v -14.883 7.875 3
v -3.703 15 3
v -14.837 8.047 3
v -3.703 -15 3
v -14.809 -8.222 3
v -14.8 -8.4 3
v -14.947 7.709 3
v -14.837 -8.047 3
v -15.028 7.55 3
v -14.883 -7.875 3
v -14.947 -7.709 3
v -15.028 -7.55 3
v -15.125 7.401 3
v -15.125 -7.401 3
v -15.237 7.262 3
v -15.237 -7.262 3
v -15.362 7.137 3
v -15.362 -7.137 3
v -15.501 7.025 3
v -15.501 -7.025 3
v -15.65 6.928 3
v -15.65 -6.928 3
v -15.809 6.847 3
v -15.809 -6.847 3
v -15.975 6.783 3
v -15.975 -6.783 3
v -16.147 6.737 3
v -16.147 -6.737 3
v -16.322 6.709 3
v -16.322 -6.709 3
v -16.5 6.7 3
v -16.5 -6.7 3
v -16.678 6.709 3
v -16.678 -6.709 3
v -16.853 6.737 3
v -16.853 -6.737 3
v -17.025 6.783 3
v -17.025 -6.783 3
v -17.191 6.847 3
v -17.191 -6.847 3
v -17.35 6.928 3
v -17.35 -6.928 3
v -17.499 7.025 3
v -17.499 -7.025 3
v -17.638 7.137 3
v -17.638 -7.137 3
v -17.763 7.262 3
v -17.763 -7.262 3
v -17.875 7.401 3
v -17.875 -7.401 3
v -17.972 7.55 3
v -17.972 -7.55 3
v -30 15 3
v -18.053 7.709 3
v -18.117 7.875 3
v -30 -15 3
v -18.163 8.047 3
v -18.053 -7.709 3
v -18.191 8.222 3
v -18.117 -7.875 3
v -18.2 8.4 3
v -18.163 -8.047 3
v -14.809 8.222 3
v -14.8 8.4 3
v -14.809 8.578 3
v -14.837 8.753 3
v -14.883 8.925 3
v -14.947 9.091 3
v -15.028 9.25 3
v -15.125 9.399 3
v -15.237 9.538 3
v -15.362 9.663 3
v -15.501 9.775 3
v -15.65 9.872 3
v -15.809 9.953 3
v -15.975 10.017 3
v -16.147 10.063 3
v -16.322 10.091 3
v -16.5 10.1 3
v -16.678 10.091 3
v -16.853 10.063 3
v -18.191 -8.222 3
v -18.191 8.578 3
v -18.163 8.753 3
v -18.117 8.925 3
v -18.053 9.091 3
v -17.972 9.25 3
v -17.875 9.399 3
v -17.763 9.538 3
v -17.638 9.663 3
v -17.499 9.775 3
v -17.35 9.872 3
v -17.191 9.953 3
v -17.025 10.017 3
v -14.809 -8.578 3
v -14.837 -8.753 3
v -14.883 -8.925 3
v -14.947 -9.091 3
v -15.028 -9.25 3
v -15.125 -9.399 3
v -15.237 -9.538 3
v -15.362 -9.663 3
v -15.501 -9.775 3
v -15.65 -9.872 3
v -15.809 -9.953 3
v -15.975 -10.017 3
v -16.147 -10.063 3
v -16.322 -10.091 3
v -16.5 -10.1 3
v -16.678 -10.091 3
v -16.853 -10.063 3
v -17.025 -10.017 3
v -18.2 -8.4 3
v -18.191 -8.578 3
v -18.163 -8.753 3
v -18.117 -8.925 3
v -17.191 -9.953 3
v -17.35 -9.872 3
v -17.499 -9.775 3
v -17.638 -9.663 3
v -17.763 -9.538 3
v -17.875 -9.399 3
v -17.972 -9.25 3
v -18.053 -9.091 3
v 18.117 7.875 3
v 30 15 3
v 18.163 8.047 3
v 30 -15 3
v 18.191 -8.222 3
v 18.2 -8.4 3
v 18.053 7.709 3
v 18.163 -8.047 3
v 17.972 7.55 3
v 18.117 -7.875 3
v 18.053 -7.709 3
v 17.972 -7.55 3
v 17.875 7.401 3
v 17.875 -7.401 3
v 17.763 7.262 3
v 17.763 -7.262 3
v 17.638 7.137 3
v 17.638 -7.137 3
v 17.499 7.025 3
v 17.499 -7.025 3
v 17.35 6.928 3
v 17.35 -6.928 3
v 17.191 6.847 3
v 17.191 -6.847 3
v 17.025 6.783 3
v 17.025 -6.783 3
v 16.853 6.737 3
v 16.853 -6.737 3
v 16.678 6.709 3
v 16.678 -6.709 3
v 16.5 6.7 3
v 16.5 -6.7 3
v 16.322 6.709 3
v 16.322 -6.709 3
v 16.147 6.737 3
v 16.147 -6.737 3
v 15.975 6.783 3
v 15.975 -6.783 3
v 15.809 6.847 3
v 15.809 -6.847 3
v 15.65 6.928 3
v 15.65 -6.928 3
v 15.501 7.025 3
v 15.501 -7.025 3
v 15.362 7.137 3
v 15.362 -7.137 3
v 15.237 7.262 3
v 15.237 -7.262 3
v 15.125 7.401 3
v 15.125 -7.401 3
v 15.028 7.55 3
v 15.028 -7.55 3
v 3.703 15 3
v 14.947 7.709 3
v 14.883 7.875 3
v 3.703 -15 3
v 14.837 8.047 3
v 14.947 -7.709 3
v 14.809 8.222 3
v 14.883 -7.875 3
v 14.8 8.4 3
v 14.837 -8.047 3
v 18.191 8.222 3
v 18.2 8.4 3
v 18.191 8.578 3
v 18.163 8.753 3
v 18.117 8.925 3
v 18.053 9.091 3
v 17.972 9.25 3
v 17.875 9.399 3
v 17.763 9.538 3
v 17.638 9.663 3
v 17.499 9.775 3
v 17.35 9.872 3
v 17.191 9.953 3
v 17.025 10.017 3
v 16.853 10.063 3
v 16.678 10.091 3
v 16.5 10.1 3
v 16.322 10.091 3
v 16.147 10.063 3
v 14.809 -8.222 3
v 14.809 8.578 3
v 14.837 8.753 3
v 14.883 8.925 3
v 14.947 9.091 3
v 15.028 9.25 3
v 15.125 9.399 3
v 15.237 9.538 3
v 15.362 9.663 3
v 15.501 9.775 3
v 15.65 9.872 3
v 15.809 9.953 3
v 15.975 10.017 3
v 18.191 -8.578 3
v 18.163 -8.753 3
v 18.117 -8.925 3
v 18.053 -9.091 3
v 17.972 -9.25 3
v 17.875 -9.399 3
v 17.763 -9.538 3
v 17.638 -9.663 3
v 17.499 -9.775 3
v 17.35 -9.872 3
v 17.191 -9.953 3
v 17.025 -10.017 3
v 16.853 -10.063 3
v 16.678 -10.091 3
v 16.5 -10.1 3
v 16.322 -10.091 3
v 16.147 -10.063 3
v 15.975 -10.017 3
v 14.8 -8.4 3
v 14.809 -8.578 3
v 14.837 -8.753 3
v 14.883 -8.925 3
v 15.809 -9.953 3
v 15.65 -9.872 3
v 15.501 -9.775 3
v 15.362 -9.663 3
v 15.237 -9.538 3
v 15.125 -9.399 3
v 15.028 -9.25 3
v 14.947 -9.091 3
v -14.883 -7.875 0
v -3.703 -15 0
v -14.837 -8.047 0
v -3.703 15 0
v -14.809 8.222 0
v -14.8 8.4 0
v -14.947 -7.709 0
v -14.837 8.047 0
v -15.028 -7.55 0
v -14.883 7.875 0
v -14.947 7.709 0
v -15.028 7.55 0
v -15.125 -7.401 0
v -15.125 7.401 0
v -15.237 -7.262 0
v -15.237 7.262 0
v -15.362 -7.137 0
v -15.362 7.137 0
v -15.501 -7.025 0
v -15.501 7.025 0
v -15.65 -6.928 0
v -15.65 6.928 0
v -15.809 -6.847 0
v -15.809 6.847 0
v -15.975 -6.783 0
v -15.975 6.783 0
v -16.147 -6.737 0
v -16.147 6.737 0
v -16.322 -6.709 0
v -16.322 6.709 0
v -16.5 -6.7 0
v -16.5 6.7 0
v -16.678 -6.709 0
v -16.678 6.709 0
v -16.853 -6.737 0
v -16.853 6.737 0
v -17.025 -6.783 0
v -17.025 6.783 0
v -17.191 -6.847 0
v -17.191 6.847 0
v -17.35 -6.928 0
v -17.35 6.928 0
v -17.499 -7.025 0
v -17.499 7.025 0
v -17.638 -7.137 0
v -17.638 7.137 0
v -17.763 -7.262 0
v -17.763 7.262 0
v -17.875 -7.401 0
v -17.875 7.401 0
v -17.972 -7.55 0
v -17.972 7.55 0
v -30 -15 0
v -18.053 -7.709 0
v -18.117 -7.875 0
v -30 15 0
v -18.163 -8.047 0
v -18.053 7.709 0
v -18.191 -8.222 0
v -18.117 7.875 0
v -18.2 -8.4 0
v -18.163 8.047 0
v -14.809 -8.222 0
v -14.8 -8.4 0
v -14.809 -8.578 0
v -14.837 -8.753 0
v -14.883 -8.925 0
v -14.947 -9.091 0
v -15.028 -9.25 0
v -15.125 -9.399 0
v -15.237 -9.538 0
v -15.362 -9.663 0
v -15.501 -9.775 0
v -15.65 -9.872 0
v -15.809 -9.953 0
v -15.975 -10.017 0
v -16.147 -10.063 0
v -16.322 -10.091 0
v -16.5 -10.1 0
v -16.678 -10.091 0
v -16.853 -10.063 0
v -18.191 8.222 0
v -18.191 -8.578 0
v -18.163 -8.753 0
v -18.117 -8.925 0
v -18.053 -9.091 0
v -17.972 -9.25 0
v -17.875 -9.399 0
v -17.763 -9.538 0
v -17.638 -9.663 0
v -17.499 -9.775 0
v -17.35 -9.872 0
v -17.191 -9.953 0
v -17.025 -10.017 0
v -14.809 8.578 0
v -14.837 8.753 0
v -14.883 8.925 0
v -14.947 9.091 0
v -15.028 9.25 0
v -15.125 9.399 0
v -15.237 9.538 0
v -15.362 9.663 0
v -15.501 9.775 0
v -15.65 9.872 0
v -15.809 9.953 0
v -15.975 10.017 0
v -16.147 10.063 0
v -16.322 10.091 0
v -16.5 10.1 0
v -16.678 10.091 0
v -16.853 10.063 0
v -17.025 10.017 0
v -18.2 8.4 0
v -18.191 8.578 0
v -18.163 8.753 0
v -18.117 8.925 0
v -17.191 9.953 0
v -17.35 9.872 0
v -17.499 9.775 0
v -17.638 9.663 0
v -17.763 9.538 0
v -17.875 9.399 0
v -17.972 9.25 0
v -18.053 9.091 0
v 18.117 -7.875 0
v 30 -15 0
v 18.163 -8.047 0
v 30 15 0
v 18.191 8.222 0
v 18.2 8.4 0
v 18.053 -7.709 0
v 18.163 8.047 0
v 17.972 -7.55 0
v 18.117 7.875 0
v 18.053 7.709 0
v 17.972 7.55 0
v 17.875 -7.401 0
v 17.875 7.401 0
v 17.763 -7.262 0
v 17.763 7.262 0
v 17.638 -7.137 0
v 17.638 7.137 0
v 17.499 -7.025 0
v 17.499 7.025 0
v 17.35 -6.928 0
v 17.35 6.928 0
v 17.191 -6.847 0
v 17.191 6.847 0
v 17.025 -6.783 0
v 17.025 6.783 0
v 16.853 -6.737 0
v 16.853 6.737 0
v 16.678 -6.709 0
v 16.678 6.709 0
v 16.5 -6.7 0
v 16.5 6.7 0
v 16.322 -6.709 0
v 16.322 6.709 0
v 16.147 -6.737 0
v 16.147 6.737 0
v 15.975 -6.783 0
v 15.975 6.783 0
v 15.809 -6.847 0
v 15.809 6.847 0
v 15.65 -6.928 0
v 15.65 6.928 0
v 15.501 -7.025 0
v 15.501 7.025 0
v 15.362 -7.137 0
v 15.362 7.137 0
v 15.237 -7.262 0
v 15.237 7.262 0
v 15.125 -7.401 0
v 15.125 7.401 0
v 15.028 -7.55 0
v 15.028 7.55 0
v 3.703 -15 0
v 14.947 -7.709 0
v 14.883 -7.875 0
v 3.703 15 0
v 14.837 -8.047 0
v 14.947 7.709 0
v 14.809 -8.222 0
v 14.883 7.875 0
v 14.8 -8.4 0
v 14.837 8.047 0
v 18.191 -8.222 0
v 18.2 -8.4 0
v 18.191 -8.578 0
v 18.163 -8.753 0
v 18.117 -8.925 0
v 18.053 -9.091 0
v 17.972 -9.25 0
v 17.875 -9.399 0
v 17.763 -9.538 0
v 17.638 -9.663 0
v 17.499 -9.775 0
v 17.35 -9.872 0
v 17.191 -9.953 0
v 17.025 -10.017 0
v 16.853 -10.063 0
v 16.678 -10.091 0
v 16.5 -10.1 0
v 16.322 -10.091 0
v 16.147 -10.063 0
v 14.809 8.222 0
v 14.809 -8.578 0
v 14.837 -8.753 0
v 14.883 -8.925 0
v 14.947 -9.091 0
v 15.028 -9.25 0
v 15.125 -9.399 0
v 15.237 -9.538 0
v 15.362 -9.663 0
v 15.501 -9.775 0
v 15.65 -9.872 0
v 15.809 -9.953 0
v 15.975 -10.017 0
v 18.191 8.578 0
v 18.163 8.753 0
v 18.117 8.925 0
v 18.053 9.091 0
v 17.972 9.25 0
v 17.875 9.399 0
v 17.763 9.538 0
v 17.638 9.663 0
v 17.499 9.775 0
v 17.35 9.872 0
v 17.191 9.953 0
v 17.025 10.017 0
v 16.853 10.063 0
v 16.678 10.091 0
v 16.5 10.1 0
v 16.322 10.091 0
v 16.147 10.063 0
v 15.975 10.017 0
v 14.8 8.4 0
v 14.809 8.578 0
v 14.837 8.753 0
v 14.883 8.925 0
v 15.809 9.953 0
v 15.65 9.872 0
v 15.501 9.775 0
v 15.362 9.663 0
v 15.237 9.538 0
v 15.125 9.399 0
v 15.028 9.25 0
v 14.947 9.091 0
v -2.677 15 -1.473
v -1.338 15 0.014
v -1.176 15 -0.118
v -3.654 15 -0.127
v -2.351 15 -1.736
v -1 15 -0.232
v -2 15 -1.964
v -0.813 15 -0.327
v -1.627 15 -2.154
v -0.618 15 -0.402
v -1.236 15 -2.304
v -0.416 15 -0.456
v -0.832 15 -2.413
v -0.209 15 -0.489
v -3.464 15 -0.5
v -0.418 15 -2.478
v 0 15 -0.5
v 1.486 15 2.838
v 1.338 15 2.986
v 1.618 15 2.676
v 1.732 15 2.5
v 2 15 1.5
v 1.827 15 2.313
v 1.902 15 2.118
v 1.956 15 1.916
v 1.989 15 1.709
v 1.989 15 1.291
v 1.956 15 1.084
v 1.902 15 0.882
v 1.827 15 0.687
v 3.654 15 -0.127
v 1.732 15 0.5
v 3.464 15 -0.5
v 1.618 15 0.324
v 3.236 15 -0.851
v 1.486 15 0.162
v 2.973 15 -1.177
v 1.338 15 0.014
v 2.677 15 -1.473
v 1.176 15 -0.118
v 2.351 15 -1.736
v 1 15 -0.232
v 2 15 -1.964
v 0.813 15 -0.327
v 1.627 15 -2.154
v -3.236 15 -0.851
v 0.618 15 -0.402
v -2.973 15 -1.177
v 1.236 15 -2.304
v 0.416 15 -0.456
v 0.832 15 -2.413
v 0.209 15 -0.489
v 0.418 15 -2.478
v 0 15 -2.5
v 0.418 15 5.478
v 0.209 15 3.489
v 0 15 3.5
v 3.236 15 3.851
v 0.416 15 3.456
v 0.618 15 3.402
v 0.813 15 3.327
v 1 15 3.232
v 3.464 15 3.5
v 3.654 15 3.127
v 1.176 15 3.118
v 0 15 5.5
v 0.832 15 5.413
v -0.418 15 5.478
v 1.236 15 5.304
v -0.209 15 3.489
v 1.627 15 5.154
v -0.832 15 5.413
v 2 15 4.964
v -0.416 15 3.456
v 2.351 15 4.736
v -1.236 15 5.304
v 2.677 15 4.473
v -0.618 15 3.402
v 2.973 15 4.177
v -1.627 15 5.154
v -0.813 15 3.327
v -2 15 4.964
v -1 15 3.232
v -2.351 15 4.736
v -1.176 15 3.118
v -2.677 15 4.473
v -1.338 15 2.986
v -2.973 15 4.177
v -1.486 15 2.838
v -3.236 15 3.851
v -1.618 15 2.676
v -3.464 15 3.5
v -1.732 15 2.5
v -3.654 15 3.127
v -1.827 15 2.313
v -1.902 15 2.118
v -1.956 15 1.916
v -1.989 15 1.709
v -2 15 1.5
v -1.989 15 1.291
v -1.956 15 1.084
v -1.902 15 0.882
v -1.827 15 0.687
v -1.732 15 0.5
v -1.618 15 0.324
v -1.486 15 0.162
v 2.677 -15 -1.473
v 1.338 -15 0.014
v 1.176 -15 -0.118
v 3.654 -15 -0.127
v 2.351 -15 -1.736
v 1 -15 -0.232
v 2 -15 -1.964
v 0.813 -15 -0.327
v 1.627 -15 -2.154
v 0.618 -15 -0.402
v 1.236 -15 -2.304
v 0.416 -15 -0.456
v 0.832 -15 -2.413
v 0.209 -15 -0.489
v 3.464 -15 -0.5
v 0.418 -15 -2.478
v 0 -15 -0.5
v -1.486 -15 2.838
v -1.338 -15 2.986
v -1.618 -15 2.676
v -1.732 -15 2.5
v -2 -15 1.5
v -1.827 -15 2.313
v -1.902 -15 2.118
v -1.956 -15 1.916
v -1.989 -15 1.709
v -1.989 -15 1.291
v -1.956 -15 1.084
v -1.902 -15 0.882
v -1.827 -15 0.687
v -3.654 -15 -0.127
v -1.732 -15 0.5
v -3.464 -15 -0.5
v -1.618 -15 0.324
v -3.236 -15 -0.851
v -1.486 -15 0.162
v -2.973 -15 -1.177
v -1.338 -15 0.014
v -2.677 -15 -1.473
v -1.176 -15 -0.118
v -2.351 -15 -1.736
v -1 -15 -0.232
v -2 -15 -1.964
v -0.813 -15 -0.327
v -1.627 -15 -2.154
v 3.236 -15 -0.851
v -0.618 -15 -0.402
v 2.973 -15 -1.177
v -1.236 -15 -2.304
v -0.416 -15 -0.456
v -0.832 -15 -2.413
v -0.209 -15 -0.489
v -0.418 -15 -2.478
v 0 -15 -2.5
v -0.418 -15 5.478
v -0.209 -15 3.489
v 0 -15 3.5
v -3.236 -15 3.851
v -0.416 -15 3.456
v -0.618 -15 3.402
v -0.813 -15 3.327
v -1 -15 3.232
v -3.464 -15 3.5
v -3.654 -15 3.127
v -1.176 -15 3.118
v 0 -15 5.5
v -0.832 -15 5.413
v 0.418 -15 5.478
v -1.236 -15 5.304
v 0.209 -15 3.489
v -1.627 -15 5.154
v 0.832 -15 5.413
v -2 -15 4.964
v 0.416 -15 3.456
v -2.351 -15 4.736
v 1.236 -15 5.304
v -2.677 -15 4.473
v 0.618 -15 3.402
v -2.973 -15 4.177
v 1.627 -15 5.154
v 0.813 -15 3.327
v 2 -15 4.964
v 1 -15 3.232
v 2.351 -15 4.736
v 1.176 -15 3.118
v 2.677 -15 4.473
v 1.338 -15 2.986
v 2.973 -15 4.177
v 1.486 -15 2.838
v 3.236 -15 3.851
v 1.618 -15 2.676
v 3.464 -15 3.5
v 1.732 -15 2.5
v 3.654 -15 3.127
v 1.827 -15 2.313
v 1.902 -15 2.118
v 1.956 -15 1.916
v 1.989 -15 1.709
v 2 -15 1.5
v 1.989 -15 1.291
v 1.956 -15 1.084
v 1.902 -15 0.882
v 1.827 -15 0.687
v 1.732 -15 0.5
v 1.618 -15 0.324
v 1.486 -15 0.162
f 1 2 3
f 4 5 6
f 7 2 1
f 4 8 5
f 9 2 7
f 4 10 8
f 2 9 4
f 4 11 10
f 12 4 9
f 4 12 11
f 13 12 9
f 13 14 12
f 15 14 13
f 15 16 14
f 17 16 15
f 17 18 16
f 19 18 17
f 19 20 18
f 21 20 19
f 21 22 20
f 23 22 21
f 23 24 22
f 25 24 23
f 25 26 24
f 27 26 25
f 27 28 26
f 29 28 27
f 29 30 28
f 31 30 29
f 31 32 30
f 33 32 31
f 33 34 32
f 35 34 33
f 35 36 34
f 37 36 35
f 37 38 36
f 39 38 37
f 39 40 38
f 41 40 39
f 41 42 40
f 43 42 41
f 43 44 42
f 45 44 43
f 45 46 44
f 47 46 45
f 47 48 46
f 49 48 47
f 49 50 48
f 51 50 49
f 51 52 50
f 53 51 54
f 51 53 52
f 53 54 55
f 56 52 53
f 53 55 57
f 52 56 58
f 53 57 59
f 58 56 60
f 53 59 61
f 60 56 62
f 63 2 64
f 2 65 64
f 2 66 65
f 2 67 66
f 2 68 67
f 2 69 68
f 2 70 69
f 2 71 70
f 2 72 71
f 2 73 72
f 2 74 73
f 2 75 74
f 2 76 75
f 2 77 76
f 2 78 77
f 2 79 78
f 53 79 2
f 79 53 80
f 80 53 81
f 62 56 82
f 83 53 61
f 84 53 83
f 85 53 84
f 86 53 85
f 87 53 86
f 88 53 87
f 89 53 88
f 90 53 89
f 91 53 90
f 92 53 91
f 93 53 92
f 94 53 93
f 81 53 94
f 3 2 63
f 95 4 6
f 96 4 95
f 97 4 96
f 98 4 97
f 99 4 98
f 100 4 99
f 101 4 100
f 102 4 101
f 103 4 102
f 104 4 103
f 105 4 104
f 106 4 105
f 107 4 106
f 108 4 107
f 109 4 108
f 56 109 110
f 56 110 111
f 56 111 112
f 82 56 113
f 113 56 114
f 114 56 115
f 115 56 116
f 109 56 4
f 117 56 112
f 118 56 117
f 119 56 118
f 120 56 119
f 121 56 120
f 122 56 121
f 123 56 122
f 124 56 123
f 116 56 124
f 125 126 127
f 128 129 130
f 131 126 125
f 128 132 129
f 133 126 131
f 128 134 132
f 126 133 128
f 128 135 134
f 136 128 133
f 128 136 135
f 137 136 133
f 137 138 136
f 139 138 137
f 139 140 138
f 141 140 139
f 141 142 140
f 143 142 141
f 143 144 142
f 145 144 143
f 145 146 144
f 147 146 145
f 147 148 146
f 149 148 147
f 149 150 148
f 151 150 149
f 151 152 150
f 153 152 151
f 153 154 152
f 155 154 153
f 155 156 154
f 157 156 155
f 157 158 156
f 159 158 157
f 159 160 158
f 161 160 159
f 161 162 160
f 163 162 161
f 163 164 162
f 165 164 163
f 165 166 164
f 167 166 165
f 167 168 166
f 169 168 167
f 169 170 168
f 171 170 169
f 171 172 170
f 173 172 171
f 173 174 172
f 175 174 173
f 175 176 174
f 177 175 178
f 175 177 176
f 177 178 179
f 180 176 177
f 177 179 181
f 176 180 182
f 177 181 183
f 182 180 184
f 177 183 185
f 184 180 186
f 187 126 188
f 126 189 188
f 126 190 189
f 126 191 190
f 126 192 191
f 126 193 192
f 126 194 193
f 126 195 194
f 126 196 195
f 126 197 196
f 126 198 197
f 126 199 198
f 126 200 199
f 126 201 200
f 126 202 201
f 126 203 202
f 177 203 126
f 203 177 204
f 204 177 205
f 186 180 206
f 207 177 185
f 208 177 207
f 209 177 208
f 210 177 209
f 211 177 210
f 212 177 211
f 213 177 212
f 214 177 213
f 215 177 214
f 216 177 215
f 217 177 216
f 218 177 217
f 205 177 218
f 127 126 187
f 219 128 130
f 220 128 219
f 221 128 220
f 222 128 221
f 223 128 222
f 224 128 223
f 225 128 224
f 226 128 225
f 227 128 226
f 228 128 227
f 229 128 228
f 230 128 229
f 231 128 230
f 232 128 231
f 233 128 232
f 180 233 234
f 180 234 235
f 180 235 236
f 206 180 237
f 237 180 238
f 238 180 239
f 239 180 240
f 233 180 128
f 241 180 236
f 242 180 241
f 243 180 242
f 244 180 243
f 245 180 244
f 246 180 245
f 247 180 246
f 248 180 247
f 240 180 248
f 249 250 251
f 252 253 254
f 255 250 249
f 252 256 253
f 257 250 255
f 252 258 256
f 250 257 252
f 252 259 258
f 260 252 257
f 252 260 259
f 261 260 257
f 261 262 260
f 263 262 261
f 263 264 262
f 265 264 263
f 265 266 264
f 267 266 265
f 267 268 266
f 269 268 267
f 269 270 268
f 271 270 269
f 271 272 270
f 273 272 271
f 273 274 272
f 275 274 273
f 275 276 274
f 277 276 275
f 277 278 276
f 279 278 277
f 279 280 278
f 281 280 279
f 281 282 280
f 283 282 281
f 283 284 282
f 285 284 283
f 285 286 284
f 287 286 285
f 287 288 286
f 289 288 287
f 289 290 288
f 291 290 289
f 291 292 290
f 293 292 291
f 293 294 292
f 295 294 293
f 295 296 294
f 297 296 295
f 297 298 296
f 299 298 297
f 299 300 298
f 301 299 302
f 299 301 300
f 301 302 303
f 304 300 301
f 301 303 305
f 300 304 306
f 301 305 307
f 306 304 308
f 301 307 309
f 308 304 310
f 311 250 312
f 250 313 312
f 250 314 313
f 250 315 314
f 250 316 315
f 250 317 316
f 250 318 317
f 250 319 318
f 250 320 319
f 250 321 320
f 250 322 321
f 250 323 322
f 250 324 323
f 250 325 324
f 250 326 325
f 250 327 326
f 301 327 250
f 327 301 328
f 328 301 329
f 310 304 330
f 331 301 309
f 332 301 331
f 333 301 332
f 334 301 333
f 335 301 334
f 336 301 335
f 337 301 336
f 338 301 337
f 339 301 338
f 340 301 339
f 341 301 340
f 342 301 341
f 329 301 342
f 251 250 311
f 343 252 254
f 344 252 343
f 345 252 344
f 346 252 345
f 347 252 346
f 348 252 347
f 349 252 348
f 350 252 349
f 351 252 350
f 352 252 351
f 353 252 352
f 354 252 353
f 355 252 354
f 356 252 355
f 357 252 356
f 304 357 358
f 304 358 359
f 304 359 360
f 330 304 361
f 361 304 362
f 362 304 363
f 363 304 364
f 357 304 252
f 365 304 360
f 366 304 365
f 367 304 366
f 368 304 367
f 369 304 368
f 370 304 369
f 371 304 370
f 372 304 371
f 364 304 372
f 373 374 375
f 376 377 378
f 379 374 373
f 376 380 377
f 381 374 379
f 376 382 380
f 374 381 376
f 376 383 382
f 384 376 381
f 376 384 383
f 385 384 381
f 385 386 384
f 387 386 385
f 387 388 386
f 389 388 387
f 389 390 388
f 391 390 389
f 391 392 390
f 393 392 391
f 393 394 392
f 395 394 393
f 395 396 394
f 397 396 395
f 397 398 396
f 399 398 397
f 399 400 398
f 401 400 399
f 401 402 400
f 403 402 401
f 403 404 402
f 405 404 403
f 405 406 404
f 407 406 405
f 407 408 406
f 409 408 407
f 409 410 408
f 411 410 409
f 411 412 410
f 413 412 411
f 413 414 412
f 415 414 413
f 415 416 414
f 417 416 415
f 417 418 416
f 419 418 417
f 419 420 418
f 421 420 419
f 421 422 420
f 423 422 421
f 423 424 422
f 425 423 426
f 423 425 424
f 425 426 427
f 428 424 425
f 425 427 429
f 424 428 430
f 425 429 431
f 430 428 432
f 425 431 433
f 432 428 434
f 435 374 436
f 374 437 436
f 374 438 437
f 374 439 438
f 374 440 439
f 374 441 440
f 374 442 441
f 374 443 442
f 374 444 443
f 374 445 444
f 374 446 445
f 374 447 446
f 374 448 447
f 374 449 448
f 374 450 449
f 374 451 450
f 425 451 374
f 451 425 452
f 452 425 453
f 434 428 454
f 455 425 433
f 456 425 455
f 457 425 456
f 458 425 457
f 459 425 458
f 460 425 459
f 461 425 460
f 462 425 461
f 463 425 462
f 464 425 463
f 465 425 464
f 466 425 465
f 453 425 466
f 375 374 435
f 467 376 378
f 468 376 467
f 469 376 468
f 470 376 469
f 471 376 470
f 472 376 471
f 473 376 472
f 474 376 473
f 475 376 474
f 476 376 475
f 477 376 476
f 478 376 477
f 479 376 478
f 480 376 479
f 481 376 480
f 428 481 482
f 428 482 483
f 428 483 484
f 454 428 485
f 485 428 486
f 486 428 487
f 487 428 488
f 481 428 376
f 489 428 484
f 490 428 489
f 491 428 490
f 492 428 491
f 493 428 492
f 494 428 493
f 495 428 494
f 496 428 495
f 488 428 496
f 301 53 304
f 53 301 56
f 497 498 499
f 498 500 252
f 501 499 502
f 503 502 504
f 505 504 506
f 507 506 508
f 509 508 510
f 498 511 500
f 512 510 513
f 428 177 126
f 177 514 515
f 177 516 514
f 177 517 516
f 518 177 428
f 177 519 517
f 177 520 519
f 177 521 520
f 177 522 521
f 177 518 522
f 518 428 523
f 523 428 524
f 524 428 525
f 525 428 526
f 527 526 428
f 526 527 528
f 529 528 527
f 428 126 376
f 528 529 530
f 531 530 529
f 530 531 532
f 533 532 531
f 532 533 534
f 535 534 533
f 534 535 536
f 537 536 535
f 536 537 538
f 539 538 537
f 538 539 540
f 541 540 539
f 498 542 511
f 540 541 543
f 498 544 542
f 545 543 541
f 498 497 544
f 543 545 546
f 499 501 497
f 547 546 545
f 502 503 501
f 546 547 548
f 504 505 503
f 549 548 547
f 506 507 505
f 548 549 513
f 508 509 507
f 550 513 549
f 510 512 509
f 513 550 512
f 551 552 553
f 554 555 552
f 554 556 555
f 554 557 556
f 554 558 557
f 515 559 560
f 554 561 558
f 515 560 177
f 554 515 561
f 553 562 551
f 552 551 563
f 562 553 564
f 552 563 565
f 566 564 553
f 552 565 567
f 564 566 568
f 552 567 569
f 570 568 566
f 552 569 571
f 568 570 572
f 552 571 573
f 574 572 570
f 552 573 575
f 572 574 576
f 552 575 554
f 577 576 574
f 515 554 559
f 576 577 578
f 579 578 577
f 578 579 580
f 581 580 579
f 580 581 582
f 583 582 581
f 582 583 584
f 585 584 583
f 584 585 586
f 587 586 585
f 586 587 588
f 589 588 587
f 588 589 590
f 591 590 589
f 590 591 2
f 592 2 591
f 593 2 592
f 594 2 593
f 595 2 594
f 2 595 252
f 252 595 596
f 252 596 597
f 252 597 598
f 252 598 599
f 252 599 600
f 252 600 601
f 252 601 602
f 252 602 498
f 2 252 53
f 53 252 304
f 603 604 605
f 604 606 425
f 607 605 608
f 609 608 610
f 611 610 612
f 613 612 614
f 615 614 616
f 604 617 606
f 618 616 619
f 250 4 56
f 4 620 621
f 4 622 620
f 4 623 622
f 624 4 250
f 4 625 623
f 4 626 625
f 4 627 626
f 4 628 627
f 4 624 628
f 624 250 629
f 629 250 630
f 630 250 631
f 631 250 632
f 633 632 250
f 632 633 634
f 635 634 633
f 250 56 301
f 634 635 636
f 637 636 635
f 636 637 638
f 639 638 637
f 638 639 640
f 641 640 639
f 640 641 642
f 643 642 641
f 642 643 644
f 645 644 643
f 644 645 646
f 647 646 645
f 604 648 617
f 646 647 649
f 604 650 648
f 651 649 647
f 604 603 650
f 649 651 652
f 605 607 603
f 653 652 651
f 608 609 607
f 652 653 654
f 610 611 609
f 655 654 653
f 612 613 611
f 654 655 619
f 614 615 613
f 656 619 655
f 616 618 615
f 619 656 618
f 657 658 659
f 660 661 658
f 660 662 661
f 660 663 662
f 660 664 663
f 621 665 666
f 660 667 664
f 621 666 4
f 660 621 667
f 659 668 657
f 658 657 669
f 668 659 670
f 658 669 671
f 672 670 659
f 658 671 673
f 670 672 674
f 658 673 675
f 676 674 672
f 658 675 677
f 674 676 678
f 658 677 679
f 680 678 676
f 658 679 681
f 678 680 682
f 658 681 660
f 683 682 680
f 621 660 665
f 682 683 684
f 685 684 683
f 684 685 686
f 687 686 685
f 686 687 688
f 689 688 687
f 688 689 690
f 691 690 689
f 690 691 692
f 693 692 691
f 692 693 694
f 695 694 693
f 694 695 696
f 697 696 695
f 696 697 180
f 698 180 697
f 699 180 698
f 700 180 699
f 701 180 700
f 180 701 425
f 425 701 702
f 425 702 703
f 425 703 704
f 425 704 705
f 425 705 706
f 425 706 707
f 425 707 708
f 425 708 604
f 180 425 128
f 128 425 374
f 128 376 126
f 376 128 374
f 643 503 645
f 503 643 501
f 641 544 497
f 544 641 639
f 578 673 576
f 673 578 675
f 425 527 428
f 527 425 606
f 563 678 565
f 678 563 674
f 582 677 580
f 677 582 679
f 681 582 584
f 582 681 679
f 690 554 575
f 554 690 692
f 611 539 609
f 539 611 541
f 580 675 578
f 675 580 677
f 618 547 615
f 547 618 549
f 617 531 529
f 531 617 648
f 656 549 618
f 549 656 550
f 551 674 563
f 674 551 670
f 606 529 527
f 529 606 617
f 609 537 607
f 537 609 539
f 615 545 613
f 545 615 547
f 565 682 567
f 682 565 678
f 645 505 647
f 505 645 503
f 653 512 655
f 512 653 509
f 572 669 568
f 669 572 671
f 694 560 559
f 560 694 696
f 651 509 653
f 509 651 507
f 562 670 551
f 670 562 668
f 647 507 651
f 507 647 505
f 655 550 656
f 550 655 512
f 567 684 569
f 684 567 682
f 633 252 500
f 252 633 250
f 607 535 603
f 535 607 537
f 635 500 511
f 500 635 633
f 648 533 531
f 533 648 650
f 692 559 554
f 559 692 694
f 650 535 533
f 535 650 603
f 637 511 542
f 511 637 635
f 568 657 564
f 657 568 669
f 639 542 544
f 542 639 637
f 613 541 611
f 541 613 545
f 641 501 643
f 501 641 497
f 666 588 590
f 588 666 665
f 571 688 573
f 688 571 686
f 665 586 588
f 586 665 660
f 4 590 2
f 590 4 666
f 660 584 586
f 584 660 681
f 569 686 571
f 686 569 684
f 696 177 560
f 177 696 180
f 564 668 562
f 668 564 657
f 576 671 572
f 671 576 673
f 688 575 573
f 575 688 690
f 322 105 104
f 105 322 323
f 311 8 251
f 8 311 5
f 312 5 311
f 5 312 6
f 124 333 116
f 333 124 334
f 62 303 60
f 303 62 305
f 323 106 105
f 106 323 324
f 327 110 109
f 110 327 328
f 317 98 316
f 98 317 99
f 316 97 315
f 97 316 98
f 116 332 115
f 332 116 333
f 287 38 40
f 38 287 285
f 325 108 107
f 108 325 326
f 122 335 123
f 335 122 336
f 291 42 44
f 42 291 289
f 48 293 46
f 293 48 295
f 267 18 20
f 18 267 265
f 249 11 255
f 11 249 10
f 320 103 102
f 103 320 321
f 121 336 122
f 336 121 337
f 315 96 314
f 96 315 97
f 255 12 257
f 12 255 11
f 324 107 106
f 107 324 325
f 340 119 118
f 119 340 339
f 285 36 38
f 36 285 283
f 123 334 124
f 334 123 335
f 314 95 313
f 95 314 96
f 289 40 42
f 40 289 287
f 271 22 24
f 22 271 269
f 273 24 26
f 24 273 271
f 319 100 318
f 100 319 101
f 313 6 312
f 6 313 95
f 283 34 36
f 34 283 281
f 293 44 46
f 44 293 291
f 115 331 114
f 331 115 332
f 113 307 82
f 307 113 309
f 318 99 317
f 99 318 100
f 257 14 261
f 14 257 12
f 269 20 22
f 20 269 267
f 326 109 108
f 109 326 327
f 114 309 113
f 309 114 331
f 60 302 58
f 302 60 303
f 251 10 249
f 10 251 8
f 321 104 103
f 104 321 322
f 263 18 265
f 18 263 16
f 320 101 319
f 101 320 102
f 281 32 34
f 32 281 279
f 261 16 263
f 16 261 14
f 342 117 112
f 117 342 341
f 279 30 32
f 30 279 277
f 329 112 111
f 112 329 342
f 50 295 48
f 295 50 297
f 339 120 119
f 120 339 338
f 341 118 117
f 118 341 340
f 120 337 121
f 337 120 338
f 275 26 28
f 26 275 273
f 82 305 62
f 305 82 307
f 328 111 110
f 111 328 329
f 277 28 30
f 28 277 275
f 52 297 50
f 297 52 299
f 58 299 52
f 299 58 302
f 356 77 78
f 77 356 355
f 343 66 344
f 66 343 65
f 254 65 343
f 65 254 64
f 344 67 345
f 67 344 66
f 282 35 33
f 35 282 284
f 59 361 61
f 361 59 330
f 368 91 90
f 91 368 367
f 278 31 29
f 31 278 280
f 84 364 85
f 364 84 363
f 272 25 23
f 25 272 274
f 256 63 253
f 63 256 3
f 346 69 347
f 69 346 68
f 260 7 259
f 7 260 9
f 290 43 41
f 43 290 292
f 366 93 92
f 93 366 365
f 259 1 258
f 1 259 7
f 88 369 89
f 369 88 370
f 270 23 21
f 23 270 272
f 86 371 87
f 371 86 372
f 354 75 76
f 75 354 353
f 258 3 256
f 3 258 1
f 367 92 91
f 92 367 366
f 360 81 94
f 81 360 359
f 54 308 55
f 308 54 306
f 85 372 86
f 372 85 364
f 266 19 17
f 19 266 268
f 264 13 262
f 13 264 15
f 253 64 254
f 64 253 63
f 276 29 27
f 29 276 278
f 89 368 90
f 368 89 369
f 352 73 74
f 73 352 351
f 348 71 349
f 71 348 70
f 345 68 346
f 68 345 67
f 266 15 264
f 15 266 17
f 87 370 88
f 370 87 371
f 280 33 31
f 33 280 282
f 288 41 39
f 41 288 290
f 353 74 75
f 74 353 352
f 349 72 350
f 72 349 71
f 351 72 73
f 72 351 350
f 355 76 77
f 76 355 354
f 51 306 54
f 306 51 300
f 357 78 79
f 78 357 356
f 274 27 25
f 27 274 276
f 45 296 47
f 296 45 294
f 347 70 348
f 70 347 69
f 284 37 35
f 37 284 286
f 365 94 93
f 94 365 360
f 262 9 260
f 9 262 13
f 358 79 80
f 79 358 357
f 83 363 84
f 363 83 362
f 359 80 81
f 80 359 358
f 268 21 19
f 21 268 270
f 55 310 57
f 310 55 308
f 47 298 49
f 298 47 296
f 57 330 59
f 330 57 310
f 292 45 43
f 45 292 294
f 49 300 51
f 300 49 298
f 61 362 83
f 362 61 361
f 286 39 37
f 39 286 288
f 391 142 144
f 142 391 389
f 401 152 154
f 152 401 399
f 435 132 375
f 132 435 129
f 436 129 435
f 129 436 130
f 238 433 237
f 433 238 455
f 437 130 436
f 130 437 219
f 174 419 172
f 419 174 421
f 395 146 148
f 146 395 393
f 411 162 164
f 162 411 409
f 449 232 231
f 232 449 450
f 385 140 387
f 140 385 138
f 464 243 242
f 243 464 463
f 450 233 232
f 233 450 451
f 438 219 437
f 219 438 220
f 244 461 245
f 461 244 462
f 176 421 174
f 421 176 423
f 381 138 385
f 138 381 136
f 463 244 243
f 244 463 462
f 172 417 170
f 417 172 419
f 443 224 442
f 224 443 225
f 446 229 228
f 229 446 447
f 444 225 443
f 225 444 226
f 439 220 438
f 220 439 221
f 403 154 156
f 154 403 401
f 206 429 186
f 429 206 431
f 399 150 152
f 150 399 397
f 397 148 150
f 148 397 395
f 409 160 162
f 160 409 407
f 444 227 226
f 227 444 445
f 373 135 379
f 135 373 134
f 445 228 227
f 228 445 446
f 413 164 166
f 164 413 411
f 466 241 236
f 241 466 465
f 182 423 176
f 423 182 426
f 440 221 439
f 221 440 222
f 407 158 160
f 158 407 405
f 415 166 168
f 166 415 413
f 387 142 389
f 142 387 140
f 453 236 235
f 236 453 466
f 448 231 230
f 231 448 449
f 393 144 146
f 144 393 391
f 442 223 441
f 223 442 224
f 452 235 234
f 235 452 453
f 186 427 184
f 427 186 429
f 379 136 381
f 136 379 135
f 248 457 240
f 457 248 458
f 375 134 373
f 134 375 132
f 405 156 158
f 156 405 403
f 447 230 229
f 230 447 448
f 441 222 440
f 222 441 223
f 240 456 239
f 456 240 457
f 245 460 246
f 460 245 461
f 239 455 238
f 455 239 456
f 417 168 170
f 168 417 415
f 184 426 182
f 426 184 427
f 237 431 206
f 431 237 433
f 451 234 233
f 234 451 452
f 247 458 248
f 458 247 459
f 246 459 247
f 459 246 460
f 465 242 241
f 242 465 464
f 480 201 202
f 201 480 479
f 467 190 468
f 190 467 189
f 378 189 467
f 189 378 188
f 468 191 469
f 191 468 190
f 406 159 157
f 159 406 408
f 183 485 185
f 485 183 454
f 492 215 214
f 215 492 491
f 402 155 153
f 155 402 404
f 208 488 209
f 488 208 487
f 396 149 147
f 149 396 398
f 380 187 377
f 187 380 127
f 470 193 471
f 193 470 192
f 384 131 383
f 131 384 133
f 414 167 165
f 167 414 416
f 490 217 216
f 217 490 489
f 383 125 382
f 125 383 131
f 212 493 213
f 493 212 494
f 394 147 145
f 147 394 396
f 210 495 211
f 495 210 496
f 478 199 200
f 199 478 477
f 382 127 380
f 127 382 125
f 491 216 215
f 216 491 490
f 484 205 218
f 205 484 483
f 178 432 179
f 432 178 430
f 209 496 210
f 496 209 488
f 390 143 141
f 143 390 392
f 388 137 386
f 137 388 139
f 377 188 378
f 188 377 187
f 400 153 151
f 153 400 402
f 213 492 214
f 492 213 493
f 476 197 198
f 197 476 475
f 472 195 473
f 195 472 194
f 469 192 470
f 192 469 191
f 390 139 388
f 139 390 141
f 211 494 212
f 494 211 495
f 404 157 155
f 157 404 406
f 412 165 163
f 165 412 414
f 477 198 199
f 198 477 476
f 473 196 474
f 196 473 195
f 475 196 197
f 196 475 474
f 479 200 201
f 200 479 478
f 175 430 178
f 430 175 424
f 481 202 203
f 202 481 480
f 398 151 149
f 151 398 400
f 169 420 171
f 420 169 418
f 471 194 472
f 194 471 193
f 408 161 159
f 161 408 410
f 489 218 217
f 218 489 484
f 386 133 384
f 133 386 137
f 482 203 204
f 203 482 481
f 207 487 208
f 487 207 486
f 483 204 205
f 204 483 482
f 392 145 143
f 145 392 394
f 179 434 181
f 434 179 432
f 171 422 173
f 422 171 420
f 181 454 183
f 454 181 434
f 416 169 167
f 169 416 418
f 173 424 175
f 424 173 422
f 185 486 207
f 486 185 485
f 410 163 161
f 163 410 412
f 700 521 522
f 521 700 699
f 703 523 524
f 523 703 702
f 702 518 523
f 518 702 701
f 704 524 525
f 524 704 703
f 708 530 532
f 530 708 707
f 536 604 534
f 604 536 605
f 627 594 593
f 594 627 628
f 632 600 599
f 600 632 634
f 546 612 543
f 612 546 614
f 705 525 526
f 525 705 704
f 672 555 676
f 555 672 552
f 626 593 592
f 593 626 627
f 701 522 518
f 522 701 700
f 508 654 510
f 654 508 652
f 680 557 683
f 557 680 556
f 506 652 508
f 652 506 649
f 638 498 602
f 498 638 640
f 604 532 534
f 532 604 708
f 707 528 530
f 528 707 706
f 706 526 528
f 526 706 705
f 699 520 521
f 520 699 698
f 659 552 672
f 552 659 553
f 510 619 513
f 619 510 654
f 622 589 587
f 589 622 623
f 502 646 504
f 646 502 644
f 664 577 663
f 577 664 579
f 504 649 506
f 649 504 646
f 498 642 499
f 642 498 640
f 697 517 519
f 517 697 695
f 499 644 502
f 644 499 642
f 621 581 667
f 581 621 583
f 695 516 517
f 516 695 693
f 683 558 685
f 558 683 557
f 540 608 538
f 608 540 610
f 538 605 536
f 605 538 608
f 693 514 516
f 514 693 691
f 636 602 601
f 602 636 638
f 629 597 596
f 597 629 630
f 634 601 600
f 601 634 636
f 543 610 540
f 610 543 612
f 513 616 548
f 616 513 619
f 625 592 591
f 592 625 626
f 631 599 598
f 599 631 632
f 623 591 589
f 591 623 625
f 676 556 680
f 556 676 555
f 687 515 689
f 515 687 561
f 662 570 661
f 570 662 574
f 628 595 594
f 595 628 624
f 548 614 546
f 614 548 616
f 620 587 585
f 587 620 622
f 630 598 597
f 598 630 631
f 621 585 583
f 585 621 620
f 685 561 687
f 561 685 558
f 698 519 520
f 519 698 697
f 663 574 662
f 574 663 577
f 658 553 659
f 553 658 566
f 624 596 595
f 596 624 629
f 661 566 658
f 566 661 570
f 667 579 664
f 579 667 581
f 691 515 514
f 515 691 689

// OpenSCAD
// Two-leaf hinge with a printable straight pin barrel.
$fn = 60;
eps = 0.02;
leaf_l = 30;
leaf_w = 30;
leaf_t = 3;
pin_d = 4;
barrel_d = pin_d + 4;
difference() {
    union() {
        translate([-leaf_l, -leaf_w / 2, 0]) cube([leaf_l, leaf_w, leaf_t]);
        translate([0, -leaf_w / 2, 0]) cube([leaf_l, leaf_w, leaf_t]);
        translate([0, -leaf_w / 2, leaf_t / 2]) rotate([-90, 0, 0]) cylinder(d = barrel_d, h = leaf_w);
    }
    translate([0, -leaf_w / 2 - eps, leaf_t / 2]) rotate([-90, 0, 0]) cylinder(d = pin_d, h = leaf_w + 2 * eps);
    for (x = [-leaf_l * 0.55, leaf_l * 0.55], y = [-leaf_w * 0.28, leaf_w * 0.28])
        translate([x, y, -eps]) cylinder(d = 3.4, h = leaf_t + 2 * eps);
}
